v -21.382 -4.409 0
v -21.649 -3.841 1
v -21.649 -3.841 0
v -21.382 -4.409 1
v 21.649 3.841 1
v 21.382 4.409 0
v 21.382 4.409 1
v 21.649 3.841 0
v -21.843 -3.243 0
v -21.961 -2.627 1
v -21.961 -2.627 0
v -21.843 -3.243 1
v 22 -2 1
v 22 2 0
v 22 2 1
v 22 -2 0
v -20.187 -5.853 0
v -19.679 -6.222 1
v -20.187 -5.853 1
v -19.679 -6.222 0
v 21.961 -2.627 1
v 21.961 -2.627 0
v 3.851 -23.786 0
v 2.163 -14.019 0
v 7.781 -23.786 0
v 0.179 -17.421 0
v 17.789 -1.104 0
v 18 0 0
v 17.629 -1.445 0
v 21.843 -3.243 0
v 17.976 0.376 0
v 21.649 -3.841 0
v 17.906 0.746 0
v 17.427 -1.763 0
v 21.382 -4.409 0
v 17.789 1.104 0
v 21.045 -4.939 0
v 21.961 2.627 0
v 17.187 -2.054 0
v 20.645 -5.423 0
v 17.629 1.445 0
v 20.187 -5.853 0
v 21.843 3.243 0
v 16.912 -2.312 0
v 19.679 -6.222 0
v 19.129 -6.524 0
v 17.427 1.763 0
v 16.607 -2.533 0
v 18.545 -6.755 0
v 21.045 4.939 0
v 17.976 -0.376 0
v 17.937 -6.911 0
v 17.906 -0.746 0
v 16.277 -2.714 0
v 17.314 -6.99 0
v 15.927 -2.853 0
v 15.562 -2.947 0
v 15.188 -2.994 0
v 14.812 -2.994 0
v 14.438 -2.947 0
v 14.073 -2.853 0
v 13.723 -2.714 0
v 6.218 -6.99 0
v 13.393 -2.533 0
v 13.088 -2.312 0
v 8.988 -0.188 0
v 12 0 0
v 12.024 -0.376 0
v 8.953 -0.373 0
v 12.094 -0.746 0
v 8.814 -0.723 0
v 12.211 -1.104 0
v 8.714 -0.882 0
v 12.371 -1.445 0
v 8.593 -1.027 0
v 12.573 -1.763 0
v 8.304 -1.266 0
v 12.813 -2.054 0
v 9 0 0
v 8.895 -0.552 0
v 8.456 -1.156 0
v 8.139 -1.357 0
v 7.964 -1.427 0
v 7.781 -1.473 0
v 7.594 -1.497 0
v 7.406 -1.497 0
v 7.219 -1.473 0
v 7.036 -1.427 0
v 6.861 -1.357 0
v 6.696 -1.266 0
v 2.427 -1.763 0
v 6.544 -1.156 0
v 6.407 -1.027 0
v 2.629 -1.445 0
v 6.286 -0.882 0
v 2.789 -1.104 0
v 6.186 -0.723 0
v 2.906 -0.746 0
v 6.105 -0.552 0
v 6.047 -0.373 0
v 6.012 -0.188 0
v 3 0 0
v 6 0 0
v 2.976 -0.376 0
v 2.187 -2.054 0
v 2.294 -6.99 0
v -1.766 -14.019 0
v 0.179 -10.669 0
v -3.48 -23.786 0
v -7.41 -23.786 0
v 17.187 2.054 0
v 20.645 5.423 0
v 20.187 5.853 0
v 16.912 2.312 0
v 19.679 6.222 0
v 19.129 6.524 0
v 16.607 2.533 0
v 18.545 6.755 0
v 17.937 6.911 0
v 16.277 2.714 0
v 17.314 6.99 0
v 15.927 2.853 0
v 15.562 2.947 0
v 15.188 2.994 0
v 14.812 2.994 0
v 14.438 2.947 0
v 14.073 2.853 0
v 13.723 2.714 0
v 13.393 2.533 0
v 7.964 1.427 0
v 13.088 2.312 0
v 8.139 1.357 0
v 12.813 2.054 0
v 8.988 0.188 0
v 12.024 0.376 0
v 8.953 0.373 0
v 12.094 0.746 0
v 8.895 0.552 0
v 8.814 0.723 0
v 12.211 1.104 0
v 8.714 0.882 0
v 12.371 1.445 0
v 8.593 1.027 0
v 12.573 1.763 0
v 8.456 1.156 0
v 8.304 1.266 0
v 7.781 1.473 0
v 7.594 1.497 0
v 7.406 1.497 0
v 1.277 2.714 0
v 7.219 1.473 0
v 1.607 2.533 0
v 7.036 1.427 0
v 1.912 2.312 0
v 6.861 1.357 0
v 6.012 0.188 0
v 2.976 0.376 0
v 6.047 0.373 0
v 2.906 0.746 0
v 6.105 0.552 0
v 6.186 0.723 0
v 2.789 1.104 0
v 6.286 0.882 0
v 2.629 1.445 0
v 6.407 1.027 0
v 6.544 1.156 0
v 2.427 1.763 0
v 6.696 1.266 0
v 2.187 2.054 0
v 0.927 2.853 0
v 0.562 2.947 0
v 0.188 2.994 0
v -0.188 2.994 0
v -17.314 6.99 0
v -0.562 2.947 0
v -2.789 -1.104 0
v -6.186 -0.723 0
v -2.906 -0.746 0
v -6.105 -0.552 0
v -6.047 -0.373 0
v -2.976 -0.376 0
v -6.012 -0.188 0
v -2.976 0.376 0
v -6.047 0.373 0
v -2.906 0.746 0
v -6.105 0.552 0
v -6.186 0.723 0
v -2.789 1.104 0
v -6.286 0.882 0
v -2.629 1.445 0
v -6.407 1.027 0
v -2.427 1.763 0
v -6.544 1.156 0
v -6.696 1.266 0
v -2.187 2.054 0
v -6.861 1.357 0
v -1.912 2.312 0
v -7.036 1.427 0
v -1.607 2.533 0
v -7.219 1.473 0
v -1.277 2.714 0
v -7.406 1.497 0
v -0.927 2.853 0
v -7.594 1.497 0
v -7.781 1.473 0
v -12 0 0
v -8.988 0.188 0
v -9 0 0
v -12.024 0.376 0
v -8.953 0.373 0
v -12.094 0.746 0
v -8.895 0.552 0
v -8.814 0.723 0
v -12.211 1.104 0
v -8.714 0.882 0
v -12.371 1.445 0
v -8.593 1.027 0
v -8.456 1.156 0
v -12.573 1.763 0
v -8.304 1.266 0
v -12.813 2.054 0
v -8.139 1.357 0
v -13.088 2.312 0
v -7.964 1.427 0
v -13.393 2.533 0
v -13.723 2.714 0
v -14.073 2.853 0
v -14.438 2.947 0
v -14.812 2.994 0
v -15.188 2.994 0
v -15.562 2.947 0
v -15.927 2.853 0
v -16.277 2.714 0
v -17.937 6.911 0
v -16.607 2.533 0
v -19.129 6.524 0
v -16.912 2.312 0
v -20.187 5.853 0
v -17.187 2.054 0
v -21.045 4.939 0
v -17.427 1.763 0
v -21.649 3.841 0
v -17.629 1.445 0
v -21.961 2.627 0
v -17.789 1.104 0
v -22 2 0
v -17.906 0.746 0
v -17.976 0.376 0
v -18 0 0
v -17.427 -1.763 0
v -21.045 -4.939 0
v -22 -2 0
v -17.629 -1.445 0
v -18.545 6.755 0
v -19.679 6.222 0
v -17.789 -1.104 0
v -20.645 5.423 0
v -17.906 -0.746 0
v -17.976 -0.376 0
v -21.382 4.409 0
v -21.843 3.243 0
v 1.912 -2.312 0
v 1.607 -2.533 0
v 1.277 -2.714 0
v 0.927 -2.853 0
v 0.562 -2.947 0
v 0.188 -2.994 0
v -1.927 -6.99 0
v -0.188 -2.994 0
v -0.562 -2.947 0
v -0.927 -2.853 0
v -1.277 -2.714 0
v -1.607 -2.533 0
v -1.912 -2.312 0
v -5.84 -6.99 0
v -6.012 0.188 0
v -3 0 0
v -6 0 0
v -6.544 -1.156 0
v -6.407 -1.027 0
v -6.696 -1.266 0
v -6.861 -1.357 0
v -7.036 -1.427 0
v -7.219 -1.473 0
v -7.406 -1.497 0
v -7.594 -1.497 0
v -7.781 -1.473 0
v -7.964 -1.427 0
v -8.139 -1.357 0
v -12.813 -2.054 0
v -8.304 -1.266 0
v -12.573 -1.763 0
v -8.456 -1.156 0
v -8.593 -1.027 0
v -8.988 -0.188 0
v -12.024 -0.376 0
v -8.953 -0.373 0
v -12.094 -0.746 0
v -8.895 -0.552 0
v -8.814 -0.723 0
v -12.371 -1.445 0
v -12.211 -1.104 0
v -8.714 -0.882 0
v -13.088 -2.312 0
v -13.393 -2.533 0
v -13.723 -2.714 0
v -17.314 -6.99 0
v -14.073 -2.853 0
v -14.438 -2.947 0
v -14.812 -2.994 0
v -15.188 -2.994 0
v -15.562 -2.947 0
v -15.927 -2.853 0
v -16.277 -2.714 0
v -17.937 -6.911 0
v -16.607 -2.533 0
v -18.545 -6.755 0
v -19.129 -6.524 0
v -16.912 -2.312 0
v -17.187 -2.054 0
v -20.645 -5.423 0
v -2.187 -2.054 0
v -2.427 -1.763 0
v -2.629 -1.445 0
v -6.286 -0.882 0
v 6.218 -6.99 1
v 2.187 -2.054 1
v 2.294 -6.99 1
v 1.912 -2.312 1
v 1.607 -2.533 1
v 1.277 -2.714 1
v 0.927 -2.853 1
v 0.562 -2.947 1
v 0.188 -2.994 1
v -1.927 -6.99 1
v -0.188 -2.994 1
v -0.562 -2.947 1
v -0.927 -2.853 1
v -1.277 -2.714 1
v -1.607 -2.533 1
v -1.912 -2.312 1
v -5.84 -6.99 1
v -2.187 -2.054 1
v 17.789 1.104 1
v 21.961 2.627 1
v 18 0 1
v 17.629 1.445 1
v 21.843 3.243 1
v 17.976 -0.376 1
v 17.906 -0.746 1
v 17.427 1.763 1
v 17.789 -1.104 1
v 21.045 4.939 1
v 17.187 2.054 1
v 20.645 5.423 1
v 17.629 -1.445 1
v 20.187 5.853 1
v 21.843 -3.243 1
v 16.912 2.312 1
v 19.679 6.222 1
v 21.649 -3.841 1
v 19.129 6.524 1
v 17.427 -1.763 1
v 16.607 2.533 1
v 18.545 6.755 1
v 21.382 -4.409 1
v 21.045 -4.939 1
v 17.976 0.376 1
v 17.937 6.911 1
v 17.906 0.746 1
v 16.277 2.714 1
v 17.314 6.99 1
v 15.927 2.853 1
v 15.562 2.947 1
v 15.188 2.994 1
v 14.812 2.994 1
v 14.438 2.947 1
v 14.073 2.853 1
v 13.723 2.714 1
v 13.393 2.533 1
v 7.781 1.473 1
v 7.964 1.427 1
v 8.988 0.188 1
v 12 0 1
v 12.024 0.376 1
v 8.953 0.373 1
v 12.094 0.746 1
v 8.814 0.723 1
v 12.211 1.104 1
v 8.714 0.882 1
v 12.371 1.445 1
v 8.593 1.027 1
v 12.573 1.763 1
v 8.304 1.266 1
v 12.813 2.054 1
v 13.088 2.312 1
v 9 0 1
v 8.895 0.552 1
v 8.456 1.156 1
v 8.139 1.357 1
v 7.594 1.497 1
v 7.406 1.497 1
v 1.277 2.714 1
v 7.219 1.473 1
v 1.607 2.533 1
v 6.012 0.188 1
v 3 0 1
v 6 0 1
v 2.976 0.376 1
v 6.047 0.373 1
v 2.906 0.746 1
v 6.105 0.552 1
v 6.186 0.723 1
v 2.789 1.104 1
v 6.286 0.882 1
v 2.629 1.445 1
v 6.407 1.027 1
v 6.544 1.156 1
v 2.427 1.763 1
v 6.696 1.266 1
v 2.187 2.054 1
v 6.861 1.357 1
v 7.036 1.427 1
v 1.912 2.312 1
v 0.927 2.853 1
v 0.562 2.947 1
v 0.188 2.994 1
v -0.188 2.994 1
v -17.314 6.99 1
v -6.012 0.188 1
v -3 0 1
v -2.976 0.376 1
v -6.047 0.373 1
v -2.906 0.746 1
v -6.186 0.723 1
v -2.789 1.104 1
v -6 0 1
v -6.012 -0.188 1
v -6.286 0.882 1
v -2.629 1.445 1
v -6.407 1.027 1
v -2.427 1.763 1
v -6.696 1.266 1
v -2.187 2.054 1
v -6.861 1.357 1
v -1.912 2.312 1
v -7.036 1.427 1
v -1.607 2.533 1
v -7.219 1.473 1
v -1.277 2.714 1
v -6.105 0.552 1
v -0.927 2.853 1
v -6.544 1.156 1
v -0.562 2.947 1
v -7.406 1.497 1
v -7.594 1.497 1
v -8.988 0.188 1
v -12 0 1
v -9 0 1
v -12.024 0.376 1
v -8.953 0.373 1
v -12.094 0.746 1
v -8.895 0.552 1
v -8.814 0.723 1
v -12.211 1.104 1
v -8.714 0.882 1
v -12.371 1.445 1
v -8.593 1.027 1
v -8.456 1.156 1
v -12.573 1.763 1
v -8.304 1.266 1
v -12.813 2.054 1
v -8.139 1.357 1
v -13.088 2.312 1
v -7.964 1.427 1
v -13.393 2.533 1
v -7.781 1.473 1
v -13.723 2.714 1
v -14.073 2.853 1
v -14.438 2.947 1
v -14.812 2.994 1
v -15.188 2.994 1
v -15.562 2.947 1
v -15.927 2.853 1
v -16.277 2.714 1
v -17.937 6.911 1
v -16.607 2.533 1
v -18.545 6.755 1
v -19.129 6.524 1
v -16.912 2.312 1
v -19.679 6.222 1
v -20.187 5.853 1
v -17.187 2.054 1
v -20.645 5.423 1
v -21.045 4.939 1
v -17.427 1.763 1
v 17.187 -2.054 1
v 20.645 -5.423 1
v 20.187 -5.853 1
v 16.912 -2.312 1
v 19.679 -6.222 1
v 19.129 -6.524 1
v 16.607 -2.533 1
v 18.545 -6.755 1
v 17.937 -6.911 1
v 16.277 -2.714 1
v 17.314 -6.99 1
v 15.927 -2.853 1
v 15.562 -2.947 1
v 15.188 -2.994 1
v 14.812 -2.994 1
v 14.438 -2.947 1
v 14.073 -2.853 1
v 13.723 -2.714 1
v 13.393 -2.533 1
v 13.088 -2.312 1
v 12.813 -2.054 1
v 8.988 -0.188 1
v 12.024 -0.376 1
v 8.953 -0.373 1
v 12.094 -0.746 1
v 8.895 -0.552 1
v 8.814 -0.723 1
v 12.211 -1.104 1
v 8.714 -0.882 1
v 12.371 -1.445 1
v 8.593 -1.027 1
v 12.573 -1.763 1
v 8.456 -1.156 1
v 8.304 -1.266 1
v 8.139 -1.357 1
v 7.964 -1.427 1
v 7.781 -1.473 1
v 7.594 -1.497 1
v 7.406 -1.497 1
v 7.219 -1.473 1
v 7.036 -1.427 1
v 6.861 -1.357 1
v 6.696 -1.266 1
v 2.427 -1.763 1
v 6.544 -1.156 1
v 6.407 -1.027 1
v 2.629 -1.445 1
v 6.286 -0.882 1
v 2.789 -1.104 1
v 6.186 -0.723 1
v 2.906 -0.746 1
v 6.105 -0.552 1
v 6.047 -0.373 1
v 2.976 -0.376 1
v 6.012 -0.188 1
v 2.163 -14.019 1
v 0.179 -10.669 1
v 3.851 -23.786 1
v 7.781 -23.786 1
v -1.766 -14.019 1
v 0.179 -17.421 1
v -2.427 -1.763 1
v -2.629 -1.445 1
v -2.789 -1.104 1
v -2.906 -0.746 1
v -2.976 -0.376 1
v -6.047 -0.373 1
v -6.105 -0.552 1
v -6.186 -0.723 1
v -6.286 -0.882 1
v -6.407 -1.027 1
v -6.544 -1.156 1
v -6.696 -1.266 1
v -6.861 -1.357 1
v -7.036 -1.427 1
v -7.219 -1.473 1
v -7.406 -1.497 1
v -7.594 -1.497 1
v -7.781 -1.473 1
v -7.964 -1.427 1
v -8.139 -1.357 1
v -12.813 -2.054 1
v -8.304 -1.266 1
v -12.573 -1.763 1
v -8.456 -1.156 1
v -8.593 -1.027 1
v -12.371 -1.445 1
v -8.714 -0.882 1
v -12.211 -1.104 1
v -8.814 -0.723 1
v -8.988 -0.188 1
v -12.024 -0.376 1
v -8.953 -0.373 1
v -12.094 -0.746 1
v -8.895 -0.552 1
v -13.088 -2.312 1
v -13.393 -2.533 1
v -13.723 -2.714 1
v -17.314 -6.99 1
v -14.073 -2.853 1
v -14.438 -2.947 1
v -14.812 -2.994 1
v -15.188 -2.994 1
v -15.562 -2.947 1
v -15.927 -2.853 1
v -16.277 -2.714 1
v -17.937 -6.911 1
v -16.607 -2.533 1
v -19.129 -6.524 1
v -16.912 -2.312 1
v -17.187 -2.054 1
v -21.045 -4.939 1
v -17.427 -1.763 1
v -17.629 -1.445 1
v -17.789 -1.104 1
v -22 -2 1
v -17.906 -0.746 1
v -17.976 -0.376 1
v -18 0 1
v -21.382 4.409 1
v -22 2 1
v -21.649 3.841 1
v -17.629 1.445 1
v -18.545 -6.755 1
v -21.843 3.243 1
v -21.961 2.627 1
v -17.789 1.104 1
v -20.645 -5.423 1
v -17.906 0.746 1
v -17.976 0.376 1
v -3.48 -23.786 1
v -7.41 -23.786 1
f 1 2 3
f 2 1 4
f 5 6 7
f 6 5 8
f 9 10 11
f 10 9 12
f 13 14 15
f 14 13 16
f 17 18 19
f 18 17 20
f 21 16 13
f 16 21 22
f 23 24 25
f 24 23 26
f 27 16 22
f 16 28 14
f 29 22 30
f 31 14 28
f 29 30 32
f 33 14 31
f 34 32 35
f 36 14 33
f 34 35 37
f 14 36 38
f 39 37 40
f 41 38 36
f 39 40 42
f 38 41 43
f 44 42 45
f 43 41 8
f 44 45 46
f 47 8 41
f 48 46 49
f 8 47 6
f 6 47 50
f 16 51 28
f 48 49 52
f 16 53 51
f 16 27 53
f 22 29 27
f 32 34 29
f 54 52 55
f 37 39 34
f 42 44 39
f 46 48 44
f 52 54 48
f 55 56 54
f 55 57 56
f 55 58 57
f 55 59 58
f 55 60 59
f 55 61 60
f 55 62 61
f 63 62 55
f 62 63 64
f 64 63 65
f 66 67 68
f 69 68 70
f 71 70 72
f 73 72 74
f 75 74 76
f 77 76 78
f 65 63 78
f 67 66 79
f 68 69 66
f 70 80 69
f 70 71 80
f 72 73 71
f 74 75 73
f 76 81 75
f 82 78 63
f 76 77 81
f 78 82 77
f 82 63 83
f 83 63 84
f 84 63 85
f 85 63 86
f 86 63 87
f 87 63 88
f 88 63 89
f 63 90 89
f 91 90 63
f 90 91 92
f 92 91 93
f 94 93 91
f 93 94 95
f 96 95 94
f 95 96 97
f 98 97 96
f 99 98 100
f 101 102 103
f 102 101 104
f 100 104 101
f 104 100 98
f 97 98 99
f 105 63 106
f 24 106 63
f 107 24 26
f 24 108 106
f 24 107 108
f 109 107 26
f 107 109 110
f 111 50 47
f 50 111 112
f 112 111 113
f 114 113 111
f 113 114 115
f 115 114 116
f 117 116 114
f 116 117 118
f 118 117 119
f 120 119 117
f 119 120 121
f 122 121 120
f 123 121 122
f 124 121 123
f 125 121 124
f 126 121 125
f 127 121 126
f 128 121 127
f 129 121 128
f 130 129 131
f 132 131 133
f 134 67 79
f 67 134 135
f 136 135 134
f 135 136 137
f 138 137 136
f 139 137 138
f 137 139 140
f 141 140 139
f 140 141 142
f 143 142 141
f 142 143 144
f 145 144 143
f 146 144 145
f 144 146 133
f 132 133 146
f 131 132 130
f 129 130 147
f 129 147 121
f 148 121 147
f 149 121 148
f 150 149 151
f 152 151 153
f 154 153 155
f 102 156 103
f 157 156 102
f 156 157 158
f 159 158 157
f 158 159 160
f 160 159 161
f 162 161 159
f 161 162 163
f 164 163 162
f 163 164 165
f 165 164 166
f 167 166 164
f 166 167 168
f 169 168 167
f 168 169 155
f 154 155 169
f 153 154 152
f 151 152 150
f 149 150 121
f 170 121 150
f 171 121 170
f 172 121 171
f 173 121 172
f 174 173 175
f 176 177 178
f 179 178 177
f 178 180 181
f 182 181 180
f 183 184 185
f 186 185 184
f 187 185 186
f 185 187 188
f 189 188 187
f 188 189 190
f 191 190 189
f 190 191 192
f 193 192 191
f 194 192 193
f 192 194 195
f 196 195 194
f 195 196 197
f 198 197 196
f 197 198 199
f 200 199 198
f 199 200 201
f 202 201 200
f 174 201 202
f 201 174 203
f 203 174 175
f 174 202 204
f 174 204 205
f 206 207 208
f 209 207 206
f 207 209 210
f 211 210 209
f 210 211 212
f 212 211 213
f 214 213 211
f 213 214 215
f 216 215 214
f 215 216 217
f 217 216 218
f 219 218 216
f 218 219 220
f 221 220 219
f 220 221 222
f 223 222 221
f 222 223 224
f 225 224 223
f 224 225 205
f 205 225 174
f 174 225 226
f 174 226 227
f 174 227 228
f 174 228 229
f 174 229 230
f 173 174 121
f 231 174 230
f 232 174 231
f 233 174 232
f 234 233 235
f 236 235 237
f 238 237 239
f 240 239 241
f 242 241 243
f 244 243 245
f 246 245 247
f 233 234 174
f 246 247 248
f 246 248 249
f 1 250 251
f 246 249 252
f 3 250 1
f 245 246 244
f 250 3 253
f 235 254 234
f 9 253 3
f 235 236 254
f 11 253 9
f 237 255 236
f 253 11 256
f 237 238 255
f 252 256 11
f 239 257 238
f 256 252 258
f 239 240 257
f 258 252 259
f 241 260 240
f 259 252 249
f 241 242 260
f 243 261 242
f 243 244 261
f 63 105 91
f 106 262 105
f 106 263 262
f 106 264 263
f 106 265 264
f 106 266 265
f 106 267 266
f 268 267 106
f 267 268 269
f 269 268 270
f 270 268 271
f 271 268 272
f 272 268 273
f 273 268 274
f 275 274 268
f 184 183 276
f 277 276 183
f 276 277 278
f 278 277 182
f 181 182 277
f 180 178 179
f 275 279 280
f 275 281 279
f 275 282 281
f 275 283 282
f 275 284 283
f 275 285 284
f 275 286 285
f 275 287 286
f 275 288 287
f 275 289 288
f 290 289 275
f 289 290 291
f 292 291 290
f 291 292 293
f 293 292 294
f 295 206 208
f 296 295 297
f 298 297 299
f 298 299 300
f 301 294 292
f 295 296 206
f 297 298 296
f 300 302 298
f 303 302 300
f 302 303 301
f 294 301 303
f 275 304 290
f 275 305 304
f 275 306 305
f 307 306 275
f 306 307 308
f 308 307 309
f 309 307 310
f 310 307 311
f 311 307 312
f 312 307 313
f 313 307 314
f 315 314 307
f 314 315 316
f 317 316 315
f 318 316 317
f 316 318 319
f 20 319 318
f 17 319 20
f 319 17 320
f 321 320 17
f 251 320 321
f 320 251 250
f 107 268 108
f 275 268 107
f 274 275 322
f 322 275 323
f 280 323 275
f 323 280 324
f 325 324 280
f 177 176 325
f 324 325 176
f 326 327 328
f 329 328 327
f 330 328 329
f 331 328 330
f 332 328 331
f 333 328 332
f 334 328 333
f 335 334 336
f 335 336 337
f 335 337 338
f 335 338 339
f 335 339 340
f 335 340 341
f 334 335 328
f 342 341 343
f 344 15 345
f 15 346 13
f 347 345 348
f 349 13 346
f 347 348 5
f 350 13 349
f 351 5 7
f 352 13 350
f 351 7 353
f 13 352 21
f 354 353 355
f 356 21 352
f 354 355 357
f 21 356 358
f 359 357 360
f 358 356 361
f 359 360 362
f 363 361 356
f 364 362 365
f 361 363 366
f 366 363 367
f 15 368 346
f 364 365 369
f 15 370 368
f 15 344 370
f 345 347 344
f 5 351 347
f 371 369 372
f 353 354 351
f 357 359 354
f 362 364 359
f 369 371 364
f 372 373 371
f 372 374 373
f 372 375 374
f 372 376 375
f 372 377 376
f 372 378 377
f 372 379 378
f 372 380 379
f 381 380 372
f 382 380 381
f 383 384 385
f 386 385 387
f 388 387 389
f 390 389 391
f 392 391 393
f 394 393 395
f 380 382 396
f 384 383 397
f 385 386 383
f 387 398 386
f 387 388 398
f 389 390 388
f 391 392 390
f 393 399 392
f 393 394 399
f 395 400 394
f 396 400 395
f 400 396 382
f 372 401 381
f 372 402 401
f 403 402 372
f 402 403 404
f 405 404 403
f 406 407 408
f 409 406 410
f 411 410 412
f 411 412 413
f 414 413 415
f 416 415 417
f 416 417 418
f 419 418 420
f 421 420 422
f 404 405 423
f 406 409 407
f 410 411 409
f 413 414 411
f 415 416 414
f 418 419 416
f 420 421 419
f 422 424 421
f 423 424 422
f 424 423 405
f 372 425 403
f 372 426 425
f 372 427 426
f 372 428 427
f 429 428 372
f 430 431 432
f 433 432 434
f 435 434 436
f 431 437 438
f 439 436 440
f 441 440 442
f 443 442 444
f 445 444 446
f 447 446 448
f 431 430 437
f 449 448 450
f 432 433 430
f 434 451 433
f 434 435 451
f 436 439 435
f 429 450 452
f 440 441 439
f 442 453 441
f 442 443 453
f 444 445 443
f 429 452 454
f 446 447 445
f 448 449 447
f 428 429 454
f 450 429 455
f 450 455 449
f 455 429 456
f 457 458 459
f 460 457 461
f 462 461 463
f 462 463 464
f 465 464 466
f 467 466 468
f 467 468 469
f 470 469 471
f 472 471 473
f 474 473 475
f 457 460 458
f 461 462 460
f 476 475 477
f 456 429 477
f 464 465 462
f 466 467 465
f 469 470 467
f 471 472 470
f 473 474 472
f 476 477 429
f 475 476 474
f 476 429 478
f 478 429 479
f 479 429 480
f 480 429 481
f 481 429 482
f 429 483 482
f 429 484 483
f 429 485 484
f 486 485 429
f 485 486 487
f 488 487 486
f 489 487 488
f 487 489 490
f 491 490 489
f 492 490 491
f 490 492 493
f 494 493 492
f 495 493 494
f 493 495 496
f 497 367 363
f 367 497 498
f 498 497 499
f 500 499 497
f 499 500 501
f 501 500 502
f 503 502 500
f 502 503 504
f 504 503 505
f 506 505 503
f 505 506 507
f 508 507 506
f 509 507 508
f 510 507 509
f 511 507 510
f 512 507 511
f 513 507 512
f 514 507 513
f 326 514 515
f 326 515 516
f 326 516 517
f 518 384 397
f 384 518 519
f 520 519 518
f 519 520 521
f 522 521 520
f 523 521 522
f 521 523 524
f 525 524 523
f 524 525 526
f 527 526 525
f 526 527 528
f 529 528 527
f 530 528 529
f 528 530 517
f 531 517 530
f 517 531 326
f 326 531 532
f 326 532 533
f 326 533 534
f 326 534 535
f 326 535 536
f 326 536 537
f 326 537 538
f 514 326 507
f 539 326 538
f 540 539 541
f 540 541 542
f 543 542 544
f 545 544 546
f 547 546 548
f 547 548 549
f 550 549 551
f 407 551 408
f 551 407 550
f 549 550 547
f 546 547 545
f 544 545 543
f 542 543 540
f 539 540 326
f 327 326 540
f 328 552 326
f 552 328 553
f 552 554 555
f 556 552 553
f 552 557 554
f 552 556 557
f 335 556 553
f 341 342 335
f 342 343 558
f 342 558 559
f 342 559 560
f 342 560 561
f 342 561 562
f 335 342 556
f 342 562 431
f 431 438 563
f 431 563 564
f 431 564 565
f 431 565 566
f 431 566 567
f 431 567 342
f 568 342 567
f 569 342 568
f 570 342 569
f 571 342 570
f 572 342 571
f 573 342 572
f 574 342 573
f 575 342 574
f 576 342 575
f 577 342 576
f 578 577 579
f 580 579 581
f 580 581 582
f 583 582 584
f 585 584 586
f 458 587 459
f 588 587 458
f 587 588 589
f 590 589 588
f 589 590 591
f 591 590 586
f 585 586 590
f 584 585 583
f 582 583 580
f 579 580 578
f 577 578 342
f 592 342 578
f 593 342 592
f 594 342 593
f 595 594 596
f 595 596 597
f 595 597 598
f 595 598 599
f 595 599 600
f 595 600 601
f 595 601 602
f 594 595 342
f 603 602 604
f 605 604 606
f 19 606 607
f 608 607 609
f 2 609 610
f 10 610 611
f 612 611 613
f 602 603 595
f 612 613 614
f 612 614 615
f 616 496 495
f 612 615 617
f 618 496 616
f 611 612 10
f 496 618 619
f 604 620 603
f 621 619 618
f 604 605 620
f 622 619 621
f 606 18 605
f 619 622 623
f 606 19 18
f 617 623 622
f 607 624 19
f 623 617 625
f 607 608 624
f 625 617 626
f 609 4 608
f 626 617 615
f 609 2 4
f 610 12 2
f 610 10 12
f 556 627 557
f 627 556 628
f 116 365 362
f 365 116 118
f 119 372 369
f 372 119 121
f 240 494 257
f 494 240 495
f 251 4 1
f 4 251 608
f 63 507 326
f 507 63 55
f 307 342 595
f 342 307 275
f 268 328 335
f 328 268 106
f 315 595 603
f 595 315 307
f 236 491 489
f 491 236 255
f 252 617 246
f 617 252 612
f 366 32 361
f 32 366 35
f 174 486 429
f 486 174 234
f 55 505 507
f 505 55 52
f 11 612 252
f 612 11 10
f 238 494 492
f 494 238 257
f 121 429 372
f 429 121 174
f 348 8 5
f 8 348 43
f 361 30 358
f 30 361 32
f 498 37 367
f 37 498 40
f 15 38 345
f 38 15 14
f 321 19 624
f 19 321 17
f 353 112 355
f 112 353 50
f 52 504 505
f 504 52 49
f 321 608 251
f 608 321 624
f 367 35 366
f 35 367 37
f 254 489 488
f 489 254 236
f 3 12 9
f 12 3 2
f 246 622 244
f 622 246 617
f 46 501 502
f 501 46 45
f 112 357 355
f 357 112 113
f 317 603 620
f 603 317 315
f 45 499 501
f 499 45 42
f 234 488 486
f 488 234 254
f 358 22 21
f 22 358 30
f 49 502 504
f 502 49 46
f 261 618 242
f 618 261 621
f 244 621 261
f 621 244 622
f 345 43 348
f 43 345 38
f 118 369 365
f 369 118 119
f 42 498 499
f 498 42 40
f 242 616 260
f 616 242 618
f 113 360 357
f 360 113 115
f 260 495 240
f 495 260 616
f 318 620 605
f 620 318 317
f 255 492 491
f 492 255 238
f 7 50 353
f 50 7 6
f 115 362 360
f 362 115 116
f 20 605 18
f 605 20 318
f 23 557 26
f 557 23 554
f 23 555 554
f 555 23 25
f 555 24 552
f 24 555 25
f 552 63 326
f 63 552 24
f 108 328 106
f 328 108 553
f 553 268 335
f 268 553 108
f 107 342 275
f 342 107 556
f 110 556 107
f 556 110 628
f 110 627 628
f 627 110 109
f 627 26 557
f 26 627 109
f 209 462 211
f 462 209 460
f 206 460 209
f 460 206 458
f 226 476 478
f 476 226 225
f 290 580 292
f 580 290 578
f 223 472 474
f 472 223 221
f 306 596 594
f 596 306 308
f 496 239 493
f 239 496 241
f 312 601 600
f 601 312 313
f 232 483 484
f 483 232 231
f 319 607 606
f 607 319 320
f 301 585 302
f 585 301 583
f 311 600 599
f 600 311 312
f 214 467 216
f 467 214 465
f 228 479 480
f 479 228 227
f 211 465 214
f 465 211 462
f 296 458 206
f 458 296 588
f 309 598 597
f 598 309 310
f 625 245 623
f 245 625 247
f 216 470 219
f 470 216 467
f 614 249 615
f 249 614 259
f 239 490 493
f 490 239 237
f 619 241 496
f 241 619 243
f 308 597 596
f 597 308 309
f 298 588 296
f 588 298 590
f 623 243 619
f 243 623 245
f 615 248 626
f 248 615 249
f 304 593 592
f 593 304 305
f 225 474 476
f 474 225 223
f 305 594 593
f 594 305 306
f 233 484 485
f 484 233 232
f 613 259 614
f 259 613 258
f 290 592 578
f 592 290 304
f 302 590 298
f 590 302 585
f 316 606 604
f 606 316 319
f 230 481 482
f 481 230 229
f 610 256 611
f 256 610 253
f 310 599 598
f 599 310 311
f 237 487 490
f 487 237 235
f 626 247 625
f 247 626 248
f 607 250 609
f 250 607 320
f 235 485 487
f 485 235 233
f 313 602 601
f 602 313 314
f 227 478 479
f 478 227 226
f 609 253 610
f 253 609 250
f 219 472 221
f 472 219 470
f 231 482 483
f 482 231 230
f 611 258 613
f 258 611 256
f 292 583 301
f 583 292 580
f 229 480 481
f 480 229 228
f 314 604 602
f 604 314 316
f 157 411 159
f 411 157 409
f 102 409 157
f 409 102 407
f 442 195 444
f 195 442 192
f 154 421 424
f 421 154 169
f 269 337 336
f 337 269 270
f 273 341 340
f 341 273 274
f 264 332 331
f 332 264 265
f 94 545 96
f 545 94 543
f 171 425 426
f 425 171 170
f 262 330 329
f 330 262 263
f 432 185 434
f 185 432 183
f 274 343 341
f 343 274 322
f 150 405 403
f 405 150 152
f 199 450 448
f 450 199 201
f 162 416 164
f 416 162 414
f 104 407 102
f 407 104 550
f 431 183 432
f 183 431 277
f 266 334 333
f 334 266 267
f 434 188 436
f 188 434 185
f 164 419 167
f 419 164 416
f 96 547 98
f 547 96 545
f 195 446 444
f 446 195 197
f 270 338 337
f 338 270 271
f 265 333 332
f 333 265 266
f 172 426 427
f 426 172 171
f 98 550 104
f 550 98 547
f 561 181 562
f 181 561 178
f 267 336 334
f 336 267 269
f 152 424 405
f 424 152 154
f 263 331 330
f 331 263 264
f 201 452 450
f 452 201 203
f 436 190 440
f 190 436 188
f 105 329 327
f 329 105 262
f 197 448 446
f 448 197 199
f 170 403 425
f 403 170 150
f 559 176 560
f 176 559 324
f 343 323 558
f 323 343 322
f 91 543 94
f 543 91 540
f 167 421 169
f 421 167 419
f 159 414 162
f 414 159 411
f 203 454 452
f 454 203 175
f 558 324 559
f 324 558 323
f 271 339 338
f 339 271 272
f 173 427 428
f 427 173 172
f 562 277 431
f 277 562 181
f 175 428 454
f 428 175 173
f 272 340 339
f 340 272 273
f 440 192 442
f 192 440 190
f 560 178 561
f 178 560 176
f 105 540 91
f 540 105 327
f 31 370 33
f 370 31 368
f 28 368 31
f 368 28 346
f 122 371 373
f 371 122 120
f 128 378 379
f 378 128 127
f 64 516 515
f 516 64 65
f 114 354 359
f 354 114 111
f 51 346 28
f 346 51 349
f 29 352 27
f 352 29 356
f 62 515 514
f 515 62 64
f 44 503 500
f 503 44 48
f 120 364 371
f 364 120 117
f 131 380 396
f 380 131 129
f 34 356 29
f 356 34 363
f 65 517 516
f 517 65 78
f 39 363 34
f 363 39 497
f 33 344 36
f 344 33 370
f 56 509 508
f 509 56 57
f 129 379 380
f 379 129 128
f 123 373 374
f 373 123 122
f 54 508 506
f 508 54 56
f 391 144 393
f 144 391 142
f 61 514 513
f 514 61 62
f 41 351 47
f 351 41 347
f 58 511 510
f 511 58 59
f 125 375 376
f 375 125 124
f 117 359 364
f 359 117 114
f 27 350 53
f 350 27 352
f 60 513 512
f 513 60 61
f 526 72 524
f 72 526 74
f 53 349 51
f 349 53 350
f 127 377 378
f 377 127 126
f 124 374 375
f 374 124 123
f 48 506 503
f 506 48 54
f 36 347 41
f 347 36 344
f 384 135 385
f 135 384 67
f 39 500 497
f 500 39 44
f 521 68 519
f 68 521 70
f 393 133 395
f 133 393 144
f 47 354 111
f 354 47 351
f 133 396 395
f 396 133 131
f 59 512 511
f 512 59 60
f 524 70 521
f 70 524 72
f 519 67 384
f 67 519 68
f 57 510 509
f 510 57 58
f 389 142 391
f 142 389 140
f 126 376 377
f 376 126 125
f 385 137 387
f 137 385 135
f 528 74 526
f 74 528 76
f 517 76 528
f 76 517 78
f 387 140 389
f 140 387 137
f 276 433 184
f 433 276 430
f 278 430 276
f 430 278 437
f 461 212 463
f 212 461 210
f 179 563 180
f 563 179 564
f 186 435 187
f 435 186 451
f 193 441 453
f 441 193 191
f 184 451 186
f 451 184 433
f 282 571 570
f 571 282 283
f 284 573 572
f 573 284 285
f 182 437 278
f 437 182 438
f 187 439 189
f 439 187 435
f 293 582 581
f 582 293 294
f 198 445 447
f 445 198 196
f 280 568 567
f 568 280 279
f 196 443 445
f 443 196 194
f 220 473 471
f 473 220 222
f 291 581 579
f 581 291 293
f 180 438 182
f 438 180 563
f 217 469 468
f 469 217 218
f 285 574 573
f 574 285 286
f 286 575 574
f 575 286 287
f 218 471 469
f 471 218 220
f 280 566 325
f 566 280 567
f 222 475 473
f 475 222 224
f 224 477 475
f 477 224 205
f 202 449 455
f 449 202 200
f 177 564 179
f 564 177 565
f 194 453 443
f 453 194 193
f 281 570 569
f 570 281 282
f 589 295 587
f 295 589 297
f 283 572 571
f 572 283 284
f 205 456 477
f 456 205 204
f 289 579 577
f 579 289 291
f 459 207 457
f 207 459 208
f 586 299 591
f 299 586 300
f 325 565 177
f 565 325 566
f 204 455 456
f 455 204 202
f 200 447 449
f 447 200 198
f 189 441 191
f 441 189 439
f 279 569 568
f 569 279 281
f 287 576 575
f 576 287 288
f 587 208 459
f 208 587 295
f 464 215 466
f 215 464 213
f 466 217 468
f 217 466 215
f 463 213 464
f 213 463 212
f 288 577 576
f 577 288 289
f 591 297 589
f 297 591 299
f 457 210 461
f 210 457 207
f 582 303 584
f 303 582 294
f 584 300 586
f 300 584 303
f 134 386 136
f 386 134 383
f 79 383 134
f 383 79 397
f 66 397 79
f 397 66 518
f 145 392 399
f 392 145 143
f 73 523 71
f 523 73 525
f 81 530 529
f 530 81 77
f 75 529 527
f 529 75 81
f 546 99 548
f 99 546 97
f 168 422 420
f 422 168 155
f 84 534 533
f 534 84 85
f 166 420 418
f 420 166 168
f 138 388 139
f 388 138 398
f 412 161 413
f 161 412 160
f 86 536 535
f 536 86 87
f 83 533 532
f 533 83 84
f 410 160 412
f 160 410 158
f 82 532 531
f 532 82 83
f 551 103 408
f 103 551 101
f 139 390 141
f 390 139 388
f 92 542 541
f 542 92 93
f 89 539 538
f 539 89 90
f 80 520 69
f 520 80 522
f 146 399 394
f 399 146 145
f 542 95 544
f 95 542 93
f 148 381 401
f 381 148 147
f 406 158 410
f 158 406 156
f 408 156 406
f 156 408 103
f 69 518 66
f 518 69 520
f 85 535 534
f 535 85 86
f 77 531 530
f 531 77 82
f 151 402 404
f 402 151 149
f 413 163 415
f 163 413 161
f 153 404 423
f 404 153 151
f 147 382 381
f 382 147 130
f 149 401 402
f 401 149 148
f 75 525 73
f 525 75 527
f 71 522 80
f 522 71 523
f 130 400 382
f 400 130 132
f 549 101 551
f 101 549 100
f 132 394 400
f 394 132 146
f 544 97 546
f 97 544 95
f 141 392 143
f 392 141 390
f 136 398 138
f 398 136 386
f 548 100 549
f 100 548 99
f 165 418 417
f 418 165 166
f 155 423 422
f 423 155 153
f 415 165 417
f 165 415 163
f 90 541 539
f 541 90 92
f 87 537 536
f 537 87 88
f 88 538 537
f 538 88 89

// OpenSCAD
$fn = 50;


difference() {
	union() {
		hull() {
			translate(v = [-17.0000000000, 2.0000000000, 0]) {
				cylinder(h = 1, r = 5);
			}
			translate(v = [17.0000000000, 2.0000000000, 0]) {
				cylinder(h = 1, r = 5);
			}
			translate(v = [-17.0000000000, -2.0000000000, 0]) {
				cylinder(h = 1, r = 5);
			}
			translate(v = [17.0000000000, -2.0000000000, 0]) {
				cylinder(h = 1, r = 5);
			}
		}
		translate(v = [0, -5, 0]) {
			linear_extrude(height = 1) {
				text(font = "DejaVu Sans Mono:style=Bold", halign = "center", size = 19.0000000000, text = "X", valign = "top");
			}
		}
	}
	union() {
		translate(v = [-15.0000000000, 0.0000000000, 0]) {
			translate(v = [0, 0, -100]) {
				cylinder(h = 200, r = 3.0000000000);
			}
		}
		translate(v = [0, 0, -100]) {
			cylinder(h = 200, r = 3.0000000000);
		}
		translate(v = [15.0000000000, 0.0000000000, 0]) {
			translate(v = [0, 0, -100]) {
				cylinder(h = 200, r = 3.0000000000);
			}
		}
		translate(v = [-15.0000000000, 0.0000000000, 0]) {
			translate(v = [0, 0, -100]) {
				cylinder(h = 200, r = 1.5000000000);
			}
		}
		translate(v = [-7.5000000000, 0.0000000000, 0]) {
			translate(v = [0, 0, -100]) {
				cylinder(h = 200, r = 1.5000000000);
			}
		}
		translate(v = [0, 0, -100]) {
			cylinder(h = 200, r = 1.5000000000);
		}
		translate(v = [7.5000000000, 0.0000000000, 0]) {
			translate(v = [0, 0, -100]) {
				cylinder(h = 200, r = 1.5000000000);
			}
		}
		translate(v = [15.0000000000, 0.0000000000, 0]) {
			translate(v = [0, 0, -100]) {
				cylinder(h = 200, r = 1.5000000000);
			}
		}
	}
}
